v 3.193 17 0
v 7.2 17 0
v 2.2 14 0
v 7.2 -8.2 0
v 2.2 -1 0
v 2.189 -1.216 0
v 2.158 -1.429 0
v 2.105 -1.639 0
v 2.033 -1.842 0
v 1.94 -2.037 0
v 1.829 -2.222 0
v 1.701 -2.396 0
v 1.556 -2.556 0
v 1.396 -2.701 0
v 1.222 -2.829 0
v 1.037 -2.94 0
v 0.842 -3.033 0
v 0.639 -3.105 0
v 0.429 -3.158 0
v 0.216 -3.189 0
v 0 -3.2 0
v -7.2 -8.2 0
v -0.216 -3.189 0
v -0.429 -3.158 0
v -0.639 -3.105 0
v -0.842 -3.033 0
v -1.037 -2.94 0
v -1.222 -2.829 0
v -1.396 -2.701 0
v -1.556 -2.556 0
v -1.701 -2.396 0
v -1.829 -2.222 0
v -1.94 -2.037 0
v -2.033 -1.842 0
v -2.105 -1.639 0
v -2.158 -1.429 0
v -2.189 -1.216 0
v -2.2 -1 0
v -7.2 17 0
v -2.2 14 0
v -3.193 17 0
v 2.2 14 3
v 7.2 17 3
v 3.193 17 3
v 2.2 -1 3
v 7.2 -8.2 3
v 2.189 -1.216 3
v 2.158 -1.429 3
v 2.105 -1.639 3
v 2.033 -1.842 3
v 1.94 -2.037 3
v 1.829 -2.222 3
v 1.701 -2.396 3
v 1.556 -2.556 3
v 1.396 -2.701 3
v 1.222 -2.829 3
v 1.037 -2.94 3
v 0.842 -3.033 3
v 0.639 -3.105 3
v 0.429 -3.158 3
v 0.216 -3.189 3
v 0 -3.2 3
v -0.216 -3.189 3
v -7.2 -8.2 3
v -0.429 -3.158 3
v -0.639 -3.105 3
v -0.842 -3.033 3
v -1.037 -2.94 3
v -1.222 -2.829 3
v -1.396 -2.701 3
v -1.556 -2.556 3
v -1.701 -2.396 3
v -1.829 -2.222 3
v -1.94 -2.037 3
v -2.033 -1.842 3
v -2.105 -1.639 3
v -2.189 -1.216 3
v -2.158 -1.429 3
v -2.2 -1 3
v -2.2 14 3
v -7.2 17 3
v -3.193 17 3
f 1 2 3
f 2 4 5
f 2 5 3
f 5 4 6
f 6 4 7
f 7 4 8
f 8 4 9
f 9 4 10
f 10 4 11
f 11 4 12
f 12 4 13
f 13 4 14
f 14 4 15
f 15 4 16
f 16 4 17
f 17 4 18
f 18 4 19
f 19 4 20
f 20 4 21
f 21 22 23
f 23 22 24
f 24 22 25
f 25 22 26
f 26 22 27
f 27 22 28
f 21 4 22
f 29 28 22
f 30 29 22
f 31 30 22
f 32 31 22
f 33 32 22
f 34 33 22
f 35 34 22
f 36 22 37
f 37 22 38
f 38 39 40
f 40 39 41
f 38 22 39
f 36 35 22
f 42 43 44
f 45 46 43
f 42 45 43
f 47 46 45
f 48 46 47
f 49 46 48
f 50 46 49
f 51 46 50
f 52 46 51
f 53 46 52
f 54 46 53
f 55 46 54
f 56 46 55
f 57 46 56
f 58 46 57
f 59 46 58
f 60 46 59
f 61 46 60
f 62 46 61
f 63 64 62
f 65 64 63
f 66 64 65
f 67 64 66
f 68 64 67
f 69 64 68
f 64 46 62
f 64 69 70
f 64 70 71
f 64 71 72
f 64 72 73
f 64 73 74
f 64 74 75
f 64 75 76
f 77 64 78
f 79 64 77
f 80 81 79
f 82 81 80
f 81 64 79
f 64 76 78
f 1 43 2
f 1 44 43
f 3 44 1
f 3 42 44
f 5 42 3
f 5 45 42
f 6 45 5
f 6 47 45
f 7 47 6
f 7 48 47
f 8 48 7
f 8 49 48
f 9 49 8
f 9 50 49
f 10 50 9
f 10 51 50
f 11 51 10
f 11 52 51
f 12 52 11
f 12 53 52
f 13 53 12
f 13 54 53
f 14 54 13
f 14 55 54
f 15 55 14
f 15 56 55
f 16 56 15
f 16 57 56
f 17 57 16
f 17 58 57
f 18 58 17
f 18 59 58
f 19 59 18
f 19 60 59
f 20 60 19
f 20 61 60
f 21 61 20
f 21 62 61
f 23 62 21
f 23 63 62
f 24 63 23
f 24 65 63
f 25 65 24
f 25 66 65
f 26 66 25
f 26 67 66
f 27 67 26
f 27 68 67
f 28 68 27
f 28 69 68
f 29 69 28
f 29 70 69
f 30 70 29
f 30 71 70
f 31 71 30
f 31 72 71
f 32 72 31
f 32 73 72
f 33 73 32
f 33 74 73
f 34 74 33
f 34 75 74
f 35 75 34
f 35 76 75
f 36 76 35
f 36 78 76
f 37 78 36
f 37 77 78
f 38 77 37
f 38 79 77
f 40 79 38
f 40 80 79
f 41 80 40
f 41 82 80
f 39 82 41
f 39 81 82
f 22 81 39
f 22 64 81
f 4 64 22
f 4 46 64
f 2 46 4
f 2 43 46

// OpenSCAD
// file: wing-root-lead-keeper.scad
// Wing-root lead keeper. Millimeters. Stationary bench prototype only.
// ALL interface defaults are UNMEASURED EXAMPLES, not aircraft fit data.
/* [Output] */
part = "keeper"; // [keeper,contact_coupon]
/* [Plate: UNMEASURED EXAMPLES] */
plate_width = 48;
plate_height = 34;
plate_thickness = 3;
edge_radius = 2;
minimum_section = 1.2;
/* [Lead and housing: UNMEASURED EXAMPLES] */
wire_bundle_width = 3.4; // Maximum across all wire orientations to be inserted.
wire_clearance = 0.5; // Total clearance, not per side.
slot_width = 4.4;
slot_x = 0;
slot_seat_y = -1; // Center of the rounded root, relative to plate center.
mouth_flare = 1;
mouth_length = 3;
housing_minimum_width = 6; // Smallest shoulder caliper across reachable rotations.
shoulder_overlap = 0.6; // Minimum on EACH side of slot; geometric input only.
/* [Root opening/contact: UNMEASURED EXAMPLES] */
opening_width = 16; // Bounding rectangle centered at plate XY origin.
opening_height = 12;
land_width = 50; // Entire coplanar plate-body footprint must have firm contact.
land_height = 36;
contact_margin = 2;
maximum_tilt = 10; // Degrees from root normal, modeled bound; NOT mechanically enforced.
/* [Integral removal tab] */
handle_length = 28;
handle_height = 26;
handle_overlap = 4;
label_size = 3;
label_row_spacing = 2.3 * label_size; // Named row-center distance in millimeters.
label_depth = 0.6;
/* [Coupon] */
coupon_side_wall = 5;
coupon_lower_bridge = 5;
/* [Hidden] */
$fn = 64;
epsilon = 0.02;
slot_radius = slot_width / 2;
plate_top = plate_height / 2;
plate_bottom = -plate_height / 2;
slot_bottom = slot_seat_y - slot_radius;
flared_half_width = slot_radius + mouth_flare;
handle_x = plate_width / 2 + handle_length / 2 - handle_overlap;
coupon_width = slot_width + 2 * coupon_side_wall;
coupon_bottom = slot_bottom - coupon_lower_bridge;
coupon_height = plate_top - coupon_bottom;
// A disk inside the rounded rectangular body projects to an ellipse at tilt.
// Its minor diameter exceeds the opening's bounding-rectangle diagonal.
// This bounded geometric check does not constrain actual handling/slot escape.
projected_body_diameter = min(plate_width, plate_height) * cos(maximum_tilt);
opening_diagonal = sqrt(opening_width * opening_width + opening_height * opening_height);

assert(part == "keeper" || part == "contact_coupon", "Unknown part selector");
assert(min(plate_width, plate_height, plate_thickness, edge_radius, minimum_section,
           wire_bundle_width, wire_clearance, slot_width, mouth_flare, mouth_length,
           housing_minimum_width, shoulder_overlap, opening_width, opening_height,
           land_width, land_height, contact_margin, handle_length, handle_height,
           handle_overlap, label_size, label_row_spacing, label_depth, coupon_side_wall,
           coupon_lower_bridge) > 0, "Dimensions must be positive");
assert(plate_thickness >= minimum_section &&
       edge_radius < min(plate_width, plate_height, handle_length, handle_height) / 2,
       "Rounding must retain positive straight profiles and minimum thickness");
assert(slot_width >= wire_bundle_width + wire_clearance,
       "Slot must clear the measured wire bundle");
assert(slot_width + 2 * shoulder_overlap <= housing_minimum_width + 1e-9,
       "Slot must block the smallest measured housing shoulder");
assert(slot_bottom - plate_bottom >= minimum_section,
       "Slot must retain the lower bridge");
assert(plate_top - mouth_length > slot_seat_y &&
       abs(slot_x) + flared_half_width + edge_radius + minimum_section <= plate_width / 2,
       "Slot and mouth must retain side walls and a straight corridor");
assert(abs(slot_x) + slot_radius + wire_clearance / 2 <= opening_width / 2 &&
       abs(slot_seat_y) + slot_radius + wire_clearance / 2 <= opening_height / 2,
       "Rounded slot root must clear the centered opening");
assert(land_width >= plate_width && land_height >= plate_height &&
       plate_width >= opening_width + 2 * contact_margin &&
       plate_height >= opening_height + 2 * contact_margin,
       "Plate body must span the opening on firm measured contact land");
assert(maximum_tilt >= 0 && maximum_tilt < 90 &&
       projected_body_diameter > opening_diagonal + 2 * contact_margin,
       "Bounded tilt projection must exceed the opening diagonal and contact margins");
assert(handle_overlap >= edge_radius + minimum_section &&
       handle_overlap < handle_length / 2 && handle_height <= plate_height - 2 * edge_radius,
       "Tab must overlap solid plate core without crossing the top slot mouth");
assert(label_depth <= plate_thickness - minimum_section &&
       label_size * 8 <= handle_length - 2 * edge_radius &&
       label_row_spacing >= 1.5 * label_size &&
       2 * label_row_spacing + 1.2 * label_size <= handle_height - 2 * edge_radius,
       "Label must fit the tab and retain its floor");
assert(coupon_side_wall >= mouth_flare + minimum_section &&
       coupon_lower_bridge >= minimum_section &&
       coupon_bottom >= plate_bottom &&
       abs(slot_x) + coupon_width / 2 <= plate_width / 2 - edge_radius,
       "Coupon must fit within the full plate with solid walls and lower bridge");

module rounded_rectangle(width, height) {
    hull() for (x = [-width / 2 + edge_radius, width / 2 - edge_radius])
        for (y = [-height / 2 + edge_radius, height / 2 - edge_radius])
            translate([x, y]) circle(r = edge_radius);
}
module slot() {
    translate([slot_x, slot_seat_y]) circle(r = slot_radius);
    translate([slot_x - slot_radius, slot_seat_y])
        square([slot_width, plate_top - slot_seat_y + epsilon]);
    polygon([[slot_x - slot_radius, plate_top - mouth_length],
             [slot_x + slot_radius, plate_top - mouth_length],
             [slot_x + flared_half_width, plate_top + epsilon],
             [slot_x - flared_half_width, plate_top + epsilon]]);
}
module plate_profile() {
    difference() {
        union() {
            rounded_rectangle(plate_width, plate_height);
            translate([handle_x, 0]) rounded_rectangle(handle_length, handle_height);
        }
        slot();
    }
}
module keeper() {
    difference() {
        linear_extrude(plate_thickness) plate_profile();
        translate([handle_x, 0, plate_thickness - label_depth])
            linear_extrude(label_depth + epsilon) {
                translate([0, label_row_spacing]) text("REMOVE", size = label_size,
                    halign = "center", valign = "center", font = "Liberation Sans:style=Bold");
                text("BEFORE", size = label_size, halign = "center", valign = "center",
                    font = "Liberation Sans:style=Bold");
                translate([0, -label_row_spacing]) text("ASSEMBLY", size = label_size,
                    halign = "center", valign = "center", font = "Liberation Sans:style=Bold");
            }
    }
}
module contact_coupon() {
    // Exact crop of the same slot/body profile, including root, mouth and thickness.
    // Omits the removal tab; cannot establish full-plate aperture containment.
    linear_extrude(plate_thickness)
        intersection() {
            plate_profile();
            translate([slot_x - coupon_width / 2, coupon_bottom])
                square([coupon_width, coupon_height]);
        }
}
if (part == "keeper") keeper();
else contact_coupon();
// main file
// Same-source slot/contact coupon. UNMEASURED EXAMPLES; millimeters.
include <wing-root-lead-keeper.scad>
part = "contact_coupon";
